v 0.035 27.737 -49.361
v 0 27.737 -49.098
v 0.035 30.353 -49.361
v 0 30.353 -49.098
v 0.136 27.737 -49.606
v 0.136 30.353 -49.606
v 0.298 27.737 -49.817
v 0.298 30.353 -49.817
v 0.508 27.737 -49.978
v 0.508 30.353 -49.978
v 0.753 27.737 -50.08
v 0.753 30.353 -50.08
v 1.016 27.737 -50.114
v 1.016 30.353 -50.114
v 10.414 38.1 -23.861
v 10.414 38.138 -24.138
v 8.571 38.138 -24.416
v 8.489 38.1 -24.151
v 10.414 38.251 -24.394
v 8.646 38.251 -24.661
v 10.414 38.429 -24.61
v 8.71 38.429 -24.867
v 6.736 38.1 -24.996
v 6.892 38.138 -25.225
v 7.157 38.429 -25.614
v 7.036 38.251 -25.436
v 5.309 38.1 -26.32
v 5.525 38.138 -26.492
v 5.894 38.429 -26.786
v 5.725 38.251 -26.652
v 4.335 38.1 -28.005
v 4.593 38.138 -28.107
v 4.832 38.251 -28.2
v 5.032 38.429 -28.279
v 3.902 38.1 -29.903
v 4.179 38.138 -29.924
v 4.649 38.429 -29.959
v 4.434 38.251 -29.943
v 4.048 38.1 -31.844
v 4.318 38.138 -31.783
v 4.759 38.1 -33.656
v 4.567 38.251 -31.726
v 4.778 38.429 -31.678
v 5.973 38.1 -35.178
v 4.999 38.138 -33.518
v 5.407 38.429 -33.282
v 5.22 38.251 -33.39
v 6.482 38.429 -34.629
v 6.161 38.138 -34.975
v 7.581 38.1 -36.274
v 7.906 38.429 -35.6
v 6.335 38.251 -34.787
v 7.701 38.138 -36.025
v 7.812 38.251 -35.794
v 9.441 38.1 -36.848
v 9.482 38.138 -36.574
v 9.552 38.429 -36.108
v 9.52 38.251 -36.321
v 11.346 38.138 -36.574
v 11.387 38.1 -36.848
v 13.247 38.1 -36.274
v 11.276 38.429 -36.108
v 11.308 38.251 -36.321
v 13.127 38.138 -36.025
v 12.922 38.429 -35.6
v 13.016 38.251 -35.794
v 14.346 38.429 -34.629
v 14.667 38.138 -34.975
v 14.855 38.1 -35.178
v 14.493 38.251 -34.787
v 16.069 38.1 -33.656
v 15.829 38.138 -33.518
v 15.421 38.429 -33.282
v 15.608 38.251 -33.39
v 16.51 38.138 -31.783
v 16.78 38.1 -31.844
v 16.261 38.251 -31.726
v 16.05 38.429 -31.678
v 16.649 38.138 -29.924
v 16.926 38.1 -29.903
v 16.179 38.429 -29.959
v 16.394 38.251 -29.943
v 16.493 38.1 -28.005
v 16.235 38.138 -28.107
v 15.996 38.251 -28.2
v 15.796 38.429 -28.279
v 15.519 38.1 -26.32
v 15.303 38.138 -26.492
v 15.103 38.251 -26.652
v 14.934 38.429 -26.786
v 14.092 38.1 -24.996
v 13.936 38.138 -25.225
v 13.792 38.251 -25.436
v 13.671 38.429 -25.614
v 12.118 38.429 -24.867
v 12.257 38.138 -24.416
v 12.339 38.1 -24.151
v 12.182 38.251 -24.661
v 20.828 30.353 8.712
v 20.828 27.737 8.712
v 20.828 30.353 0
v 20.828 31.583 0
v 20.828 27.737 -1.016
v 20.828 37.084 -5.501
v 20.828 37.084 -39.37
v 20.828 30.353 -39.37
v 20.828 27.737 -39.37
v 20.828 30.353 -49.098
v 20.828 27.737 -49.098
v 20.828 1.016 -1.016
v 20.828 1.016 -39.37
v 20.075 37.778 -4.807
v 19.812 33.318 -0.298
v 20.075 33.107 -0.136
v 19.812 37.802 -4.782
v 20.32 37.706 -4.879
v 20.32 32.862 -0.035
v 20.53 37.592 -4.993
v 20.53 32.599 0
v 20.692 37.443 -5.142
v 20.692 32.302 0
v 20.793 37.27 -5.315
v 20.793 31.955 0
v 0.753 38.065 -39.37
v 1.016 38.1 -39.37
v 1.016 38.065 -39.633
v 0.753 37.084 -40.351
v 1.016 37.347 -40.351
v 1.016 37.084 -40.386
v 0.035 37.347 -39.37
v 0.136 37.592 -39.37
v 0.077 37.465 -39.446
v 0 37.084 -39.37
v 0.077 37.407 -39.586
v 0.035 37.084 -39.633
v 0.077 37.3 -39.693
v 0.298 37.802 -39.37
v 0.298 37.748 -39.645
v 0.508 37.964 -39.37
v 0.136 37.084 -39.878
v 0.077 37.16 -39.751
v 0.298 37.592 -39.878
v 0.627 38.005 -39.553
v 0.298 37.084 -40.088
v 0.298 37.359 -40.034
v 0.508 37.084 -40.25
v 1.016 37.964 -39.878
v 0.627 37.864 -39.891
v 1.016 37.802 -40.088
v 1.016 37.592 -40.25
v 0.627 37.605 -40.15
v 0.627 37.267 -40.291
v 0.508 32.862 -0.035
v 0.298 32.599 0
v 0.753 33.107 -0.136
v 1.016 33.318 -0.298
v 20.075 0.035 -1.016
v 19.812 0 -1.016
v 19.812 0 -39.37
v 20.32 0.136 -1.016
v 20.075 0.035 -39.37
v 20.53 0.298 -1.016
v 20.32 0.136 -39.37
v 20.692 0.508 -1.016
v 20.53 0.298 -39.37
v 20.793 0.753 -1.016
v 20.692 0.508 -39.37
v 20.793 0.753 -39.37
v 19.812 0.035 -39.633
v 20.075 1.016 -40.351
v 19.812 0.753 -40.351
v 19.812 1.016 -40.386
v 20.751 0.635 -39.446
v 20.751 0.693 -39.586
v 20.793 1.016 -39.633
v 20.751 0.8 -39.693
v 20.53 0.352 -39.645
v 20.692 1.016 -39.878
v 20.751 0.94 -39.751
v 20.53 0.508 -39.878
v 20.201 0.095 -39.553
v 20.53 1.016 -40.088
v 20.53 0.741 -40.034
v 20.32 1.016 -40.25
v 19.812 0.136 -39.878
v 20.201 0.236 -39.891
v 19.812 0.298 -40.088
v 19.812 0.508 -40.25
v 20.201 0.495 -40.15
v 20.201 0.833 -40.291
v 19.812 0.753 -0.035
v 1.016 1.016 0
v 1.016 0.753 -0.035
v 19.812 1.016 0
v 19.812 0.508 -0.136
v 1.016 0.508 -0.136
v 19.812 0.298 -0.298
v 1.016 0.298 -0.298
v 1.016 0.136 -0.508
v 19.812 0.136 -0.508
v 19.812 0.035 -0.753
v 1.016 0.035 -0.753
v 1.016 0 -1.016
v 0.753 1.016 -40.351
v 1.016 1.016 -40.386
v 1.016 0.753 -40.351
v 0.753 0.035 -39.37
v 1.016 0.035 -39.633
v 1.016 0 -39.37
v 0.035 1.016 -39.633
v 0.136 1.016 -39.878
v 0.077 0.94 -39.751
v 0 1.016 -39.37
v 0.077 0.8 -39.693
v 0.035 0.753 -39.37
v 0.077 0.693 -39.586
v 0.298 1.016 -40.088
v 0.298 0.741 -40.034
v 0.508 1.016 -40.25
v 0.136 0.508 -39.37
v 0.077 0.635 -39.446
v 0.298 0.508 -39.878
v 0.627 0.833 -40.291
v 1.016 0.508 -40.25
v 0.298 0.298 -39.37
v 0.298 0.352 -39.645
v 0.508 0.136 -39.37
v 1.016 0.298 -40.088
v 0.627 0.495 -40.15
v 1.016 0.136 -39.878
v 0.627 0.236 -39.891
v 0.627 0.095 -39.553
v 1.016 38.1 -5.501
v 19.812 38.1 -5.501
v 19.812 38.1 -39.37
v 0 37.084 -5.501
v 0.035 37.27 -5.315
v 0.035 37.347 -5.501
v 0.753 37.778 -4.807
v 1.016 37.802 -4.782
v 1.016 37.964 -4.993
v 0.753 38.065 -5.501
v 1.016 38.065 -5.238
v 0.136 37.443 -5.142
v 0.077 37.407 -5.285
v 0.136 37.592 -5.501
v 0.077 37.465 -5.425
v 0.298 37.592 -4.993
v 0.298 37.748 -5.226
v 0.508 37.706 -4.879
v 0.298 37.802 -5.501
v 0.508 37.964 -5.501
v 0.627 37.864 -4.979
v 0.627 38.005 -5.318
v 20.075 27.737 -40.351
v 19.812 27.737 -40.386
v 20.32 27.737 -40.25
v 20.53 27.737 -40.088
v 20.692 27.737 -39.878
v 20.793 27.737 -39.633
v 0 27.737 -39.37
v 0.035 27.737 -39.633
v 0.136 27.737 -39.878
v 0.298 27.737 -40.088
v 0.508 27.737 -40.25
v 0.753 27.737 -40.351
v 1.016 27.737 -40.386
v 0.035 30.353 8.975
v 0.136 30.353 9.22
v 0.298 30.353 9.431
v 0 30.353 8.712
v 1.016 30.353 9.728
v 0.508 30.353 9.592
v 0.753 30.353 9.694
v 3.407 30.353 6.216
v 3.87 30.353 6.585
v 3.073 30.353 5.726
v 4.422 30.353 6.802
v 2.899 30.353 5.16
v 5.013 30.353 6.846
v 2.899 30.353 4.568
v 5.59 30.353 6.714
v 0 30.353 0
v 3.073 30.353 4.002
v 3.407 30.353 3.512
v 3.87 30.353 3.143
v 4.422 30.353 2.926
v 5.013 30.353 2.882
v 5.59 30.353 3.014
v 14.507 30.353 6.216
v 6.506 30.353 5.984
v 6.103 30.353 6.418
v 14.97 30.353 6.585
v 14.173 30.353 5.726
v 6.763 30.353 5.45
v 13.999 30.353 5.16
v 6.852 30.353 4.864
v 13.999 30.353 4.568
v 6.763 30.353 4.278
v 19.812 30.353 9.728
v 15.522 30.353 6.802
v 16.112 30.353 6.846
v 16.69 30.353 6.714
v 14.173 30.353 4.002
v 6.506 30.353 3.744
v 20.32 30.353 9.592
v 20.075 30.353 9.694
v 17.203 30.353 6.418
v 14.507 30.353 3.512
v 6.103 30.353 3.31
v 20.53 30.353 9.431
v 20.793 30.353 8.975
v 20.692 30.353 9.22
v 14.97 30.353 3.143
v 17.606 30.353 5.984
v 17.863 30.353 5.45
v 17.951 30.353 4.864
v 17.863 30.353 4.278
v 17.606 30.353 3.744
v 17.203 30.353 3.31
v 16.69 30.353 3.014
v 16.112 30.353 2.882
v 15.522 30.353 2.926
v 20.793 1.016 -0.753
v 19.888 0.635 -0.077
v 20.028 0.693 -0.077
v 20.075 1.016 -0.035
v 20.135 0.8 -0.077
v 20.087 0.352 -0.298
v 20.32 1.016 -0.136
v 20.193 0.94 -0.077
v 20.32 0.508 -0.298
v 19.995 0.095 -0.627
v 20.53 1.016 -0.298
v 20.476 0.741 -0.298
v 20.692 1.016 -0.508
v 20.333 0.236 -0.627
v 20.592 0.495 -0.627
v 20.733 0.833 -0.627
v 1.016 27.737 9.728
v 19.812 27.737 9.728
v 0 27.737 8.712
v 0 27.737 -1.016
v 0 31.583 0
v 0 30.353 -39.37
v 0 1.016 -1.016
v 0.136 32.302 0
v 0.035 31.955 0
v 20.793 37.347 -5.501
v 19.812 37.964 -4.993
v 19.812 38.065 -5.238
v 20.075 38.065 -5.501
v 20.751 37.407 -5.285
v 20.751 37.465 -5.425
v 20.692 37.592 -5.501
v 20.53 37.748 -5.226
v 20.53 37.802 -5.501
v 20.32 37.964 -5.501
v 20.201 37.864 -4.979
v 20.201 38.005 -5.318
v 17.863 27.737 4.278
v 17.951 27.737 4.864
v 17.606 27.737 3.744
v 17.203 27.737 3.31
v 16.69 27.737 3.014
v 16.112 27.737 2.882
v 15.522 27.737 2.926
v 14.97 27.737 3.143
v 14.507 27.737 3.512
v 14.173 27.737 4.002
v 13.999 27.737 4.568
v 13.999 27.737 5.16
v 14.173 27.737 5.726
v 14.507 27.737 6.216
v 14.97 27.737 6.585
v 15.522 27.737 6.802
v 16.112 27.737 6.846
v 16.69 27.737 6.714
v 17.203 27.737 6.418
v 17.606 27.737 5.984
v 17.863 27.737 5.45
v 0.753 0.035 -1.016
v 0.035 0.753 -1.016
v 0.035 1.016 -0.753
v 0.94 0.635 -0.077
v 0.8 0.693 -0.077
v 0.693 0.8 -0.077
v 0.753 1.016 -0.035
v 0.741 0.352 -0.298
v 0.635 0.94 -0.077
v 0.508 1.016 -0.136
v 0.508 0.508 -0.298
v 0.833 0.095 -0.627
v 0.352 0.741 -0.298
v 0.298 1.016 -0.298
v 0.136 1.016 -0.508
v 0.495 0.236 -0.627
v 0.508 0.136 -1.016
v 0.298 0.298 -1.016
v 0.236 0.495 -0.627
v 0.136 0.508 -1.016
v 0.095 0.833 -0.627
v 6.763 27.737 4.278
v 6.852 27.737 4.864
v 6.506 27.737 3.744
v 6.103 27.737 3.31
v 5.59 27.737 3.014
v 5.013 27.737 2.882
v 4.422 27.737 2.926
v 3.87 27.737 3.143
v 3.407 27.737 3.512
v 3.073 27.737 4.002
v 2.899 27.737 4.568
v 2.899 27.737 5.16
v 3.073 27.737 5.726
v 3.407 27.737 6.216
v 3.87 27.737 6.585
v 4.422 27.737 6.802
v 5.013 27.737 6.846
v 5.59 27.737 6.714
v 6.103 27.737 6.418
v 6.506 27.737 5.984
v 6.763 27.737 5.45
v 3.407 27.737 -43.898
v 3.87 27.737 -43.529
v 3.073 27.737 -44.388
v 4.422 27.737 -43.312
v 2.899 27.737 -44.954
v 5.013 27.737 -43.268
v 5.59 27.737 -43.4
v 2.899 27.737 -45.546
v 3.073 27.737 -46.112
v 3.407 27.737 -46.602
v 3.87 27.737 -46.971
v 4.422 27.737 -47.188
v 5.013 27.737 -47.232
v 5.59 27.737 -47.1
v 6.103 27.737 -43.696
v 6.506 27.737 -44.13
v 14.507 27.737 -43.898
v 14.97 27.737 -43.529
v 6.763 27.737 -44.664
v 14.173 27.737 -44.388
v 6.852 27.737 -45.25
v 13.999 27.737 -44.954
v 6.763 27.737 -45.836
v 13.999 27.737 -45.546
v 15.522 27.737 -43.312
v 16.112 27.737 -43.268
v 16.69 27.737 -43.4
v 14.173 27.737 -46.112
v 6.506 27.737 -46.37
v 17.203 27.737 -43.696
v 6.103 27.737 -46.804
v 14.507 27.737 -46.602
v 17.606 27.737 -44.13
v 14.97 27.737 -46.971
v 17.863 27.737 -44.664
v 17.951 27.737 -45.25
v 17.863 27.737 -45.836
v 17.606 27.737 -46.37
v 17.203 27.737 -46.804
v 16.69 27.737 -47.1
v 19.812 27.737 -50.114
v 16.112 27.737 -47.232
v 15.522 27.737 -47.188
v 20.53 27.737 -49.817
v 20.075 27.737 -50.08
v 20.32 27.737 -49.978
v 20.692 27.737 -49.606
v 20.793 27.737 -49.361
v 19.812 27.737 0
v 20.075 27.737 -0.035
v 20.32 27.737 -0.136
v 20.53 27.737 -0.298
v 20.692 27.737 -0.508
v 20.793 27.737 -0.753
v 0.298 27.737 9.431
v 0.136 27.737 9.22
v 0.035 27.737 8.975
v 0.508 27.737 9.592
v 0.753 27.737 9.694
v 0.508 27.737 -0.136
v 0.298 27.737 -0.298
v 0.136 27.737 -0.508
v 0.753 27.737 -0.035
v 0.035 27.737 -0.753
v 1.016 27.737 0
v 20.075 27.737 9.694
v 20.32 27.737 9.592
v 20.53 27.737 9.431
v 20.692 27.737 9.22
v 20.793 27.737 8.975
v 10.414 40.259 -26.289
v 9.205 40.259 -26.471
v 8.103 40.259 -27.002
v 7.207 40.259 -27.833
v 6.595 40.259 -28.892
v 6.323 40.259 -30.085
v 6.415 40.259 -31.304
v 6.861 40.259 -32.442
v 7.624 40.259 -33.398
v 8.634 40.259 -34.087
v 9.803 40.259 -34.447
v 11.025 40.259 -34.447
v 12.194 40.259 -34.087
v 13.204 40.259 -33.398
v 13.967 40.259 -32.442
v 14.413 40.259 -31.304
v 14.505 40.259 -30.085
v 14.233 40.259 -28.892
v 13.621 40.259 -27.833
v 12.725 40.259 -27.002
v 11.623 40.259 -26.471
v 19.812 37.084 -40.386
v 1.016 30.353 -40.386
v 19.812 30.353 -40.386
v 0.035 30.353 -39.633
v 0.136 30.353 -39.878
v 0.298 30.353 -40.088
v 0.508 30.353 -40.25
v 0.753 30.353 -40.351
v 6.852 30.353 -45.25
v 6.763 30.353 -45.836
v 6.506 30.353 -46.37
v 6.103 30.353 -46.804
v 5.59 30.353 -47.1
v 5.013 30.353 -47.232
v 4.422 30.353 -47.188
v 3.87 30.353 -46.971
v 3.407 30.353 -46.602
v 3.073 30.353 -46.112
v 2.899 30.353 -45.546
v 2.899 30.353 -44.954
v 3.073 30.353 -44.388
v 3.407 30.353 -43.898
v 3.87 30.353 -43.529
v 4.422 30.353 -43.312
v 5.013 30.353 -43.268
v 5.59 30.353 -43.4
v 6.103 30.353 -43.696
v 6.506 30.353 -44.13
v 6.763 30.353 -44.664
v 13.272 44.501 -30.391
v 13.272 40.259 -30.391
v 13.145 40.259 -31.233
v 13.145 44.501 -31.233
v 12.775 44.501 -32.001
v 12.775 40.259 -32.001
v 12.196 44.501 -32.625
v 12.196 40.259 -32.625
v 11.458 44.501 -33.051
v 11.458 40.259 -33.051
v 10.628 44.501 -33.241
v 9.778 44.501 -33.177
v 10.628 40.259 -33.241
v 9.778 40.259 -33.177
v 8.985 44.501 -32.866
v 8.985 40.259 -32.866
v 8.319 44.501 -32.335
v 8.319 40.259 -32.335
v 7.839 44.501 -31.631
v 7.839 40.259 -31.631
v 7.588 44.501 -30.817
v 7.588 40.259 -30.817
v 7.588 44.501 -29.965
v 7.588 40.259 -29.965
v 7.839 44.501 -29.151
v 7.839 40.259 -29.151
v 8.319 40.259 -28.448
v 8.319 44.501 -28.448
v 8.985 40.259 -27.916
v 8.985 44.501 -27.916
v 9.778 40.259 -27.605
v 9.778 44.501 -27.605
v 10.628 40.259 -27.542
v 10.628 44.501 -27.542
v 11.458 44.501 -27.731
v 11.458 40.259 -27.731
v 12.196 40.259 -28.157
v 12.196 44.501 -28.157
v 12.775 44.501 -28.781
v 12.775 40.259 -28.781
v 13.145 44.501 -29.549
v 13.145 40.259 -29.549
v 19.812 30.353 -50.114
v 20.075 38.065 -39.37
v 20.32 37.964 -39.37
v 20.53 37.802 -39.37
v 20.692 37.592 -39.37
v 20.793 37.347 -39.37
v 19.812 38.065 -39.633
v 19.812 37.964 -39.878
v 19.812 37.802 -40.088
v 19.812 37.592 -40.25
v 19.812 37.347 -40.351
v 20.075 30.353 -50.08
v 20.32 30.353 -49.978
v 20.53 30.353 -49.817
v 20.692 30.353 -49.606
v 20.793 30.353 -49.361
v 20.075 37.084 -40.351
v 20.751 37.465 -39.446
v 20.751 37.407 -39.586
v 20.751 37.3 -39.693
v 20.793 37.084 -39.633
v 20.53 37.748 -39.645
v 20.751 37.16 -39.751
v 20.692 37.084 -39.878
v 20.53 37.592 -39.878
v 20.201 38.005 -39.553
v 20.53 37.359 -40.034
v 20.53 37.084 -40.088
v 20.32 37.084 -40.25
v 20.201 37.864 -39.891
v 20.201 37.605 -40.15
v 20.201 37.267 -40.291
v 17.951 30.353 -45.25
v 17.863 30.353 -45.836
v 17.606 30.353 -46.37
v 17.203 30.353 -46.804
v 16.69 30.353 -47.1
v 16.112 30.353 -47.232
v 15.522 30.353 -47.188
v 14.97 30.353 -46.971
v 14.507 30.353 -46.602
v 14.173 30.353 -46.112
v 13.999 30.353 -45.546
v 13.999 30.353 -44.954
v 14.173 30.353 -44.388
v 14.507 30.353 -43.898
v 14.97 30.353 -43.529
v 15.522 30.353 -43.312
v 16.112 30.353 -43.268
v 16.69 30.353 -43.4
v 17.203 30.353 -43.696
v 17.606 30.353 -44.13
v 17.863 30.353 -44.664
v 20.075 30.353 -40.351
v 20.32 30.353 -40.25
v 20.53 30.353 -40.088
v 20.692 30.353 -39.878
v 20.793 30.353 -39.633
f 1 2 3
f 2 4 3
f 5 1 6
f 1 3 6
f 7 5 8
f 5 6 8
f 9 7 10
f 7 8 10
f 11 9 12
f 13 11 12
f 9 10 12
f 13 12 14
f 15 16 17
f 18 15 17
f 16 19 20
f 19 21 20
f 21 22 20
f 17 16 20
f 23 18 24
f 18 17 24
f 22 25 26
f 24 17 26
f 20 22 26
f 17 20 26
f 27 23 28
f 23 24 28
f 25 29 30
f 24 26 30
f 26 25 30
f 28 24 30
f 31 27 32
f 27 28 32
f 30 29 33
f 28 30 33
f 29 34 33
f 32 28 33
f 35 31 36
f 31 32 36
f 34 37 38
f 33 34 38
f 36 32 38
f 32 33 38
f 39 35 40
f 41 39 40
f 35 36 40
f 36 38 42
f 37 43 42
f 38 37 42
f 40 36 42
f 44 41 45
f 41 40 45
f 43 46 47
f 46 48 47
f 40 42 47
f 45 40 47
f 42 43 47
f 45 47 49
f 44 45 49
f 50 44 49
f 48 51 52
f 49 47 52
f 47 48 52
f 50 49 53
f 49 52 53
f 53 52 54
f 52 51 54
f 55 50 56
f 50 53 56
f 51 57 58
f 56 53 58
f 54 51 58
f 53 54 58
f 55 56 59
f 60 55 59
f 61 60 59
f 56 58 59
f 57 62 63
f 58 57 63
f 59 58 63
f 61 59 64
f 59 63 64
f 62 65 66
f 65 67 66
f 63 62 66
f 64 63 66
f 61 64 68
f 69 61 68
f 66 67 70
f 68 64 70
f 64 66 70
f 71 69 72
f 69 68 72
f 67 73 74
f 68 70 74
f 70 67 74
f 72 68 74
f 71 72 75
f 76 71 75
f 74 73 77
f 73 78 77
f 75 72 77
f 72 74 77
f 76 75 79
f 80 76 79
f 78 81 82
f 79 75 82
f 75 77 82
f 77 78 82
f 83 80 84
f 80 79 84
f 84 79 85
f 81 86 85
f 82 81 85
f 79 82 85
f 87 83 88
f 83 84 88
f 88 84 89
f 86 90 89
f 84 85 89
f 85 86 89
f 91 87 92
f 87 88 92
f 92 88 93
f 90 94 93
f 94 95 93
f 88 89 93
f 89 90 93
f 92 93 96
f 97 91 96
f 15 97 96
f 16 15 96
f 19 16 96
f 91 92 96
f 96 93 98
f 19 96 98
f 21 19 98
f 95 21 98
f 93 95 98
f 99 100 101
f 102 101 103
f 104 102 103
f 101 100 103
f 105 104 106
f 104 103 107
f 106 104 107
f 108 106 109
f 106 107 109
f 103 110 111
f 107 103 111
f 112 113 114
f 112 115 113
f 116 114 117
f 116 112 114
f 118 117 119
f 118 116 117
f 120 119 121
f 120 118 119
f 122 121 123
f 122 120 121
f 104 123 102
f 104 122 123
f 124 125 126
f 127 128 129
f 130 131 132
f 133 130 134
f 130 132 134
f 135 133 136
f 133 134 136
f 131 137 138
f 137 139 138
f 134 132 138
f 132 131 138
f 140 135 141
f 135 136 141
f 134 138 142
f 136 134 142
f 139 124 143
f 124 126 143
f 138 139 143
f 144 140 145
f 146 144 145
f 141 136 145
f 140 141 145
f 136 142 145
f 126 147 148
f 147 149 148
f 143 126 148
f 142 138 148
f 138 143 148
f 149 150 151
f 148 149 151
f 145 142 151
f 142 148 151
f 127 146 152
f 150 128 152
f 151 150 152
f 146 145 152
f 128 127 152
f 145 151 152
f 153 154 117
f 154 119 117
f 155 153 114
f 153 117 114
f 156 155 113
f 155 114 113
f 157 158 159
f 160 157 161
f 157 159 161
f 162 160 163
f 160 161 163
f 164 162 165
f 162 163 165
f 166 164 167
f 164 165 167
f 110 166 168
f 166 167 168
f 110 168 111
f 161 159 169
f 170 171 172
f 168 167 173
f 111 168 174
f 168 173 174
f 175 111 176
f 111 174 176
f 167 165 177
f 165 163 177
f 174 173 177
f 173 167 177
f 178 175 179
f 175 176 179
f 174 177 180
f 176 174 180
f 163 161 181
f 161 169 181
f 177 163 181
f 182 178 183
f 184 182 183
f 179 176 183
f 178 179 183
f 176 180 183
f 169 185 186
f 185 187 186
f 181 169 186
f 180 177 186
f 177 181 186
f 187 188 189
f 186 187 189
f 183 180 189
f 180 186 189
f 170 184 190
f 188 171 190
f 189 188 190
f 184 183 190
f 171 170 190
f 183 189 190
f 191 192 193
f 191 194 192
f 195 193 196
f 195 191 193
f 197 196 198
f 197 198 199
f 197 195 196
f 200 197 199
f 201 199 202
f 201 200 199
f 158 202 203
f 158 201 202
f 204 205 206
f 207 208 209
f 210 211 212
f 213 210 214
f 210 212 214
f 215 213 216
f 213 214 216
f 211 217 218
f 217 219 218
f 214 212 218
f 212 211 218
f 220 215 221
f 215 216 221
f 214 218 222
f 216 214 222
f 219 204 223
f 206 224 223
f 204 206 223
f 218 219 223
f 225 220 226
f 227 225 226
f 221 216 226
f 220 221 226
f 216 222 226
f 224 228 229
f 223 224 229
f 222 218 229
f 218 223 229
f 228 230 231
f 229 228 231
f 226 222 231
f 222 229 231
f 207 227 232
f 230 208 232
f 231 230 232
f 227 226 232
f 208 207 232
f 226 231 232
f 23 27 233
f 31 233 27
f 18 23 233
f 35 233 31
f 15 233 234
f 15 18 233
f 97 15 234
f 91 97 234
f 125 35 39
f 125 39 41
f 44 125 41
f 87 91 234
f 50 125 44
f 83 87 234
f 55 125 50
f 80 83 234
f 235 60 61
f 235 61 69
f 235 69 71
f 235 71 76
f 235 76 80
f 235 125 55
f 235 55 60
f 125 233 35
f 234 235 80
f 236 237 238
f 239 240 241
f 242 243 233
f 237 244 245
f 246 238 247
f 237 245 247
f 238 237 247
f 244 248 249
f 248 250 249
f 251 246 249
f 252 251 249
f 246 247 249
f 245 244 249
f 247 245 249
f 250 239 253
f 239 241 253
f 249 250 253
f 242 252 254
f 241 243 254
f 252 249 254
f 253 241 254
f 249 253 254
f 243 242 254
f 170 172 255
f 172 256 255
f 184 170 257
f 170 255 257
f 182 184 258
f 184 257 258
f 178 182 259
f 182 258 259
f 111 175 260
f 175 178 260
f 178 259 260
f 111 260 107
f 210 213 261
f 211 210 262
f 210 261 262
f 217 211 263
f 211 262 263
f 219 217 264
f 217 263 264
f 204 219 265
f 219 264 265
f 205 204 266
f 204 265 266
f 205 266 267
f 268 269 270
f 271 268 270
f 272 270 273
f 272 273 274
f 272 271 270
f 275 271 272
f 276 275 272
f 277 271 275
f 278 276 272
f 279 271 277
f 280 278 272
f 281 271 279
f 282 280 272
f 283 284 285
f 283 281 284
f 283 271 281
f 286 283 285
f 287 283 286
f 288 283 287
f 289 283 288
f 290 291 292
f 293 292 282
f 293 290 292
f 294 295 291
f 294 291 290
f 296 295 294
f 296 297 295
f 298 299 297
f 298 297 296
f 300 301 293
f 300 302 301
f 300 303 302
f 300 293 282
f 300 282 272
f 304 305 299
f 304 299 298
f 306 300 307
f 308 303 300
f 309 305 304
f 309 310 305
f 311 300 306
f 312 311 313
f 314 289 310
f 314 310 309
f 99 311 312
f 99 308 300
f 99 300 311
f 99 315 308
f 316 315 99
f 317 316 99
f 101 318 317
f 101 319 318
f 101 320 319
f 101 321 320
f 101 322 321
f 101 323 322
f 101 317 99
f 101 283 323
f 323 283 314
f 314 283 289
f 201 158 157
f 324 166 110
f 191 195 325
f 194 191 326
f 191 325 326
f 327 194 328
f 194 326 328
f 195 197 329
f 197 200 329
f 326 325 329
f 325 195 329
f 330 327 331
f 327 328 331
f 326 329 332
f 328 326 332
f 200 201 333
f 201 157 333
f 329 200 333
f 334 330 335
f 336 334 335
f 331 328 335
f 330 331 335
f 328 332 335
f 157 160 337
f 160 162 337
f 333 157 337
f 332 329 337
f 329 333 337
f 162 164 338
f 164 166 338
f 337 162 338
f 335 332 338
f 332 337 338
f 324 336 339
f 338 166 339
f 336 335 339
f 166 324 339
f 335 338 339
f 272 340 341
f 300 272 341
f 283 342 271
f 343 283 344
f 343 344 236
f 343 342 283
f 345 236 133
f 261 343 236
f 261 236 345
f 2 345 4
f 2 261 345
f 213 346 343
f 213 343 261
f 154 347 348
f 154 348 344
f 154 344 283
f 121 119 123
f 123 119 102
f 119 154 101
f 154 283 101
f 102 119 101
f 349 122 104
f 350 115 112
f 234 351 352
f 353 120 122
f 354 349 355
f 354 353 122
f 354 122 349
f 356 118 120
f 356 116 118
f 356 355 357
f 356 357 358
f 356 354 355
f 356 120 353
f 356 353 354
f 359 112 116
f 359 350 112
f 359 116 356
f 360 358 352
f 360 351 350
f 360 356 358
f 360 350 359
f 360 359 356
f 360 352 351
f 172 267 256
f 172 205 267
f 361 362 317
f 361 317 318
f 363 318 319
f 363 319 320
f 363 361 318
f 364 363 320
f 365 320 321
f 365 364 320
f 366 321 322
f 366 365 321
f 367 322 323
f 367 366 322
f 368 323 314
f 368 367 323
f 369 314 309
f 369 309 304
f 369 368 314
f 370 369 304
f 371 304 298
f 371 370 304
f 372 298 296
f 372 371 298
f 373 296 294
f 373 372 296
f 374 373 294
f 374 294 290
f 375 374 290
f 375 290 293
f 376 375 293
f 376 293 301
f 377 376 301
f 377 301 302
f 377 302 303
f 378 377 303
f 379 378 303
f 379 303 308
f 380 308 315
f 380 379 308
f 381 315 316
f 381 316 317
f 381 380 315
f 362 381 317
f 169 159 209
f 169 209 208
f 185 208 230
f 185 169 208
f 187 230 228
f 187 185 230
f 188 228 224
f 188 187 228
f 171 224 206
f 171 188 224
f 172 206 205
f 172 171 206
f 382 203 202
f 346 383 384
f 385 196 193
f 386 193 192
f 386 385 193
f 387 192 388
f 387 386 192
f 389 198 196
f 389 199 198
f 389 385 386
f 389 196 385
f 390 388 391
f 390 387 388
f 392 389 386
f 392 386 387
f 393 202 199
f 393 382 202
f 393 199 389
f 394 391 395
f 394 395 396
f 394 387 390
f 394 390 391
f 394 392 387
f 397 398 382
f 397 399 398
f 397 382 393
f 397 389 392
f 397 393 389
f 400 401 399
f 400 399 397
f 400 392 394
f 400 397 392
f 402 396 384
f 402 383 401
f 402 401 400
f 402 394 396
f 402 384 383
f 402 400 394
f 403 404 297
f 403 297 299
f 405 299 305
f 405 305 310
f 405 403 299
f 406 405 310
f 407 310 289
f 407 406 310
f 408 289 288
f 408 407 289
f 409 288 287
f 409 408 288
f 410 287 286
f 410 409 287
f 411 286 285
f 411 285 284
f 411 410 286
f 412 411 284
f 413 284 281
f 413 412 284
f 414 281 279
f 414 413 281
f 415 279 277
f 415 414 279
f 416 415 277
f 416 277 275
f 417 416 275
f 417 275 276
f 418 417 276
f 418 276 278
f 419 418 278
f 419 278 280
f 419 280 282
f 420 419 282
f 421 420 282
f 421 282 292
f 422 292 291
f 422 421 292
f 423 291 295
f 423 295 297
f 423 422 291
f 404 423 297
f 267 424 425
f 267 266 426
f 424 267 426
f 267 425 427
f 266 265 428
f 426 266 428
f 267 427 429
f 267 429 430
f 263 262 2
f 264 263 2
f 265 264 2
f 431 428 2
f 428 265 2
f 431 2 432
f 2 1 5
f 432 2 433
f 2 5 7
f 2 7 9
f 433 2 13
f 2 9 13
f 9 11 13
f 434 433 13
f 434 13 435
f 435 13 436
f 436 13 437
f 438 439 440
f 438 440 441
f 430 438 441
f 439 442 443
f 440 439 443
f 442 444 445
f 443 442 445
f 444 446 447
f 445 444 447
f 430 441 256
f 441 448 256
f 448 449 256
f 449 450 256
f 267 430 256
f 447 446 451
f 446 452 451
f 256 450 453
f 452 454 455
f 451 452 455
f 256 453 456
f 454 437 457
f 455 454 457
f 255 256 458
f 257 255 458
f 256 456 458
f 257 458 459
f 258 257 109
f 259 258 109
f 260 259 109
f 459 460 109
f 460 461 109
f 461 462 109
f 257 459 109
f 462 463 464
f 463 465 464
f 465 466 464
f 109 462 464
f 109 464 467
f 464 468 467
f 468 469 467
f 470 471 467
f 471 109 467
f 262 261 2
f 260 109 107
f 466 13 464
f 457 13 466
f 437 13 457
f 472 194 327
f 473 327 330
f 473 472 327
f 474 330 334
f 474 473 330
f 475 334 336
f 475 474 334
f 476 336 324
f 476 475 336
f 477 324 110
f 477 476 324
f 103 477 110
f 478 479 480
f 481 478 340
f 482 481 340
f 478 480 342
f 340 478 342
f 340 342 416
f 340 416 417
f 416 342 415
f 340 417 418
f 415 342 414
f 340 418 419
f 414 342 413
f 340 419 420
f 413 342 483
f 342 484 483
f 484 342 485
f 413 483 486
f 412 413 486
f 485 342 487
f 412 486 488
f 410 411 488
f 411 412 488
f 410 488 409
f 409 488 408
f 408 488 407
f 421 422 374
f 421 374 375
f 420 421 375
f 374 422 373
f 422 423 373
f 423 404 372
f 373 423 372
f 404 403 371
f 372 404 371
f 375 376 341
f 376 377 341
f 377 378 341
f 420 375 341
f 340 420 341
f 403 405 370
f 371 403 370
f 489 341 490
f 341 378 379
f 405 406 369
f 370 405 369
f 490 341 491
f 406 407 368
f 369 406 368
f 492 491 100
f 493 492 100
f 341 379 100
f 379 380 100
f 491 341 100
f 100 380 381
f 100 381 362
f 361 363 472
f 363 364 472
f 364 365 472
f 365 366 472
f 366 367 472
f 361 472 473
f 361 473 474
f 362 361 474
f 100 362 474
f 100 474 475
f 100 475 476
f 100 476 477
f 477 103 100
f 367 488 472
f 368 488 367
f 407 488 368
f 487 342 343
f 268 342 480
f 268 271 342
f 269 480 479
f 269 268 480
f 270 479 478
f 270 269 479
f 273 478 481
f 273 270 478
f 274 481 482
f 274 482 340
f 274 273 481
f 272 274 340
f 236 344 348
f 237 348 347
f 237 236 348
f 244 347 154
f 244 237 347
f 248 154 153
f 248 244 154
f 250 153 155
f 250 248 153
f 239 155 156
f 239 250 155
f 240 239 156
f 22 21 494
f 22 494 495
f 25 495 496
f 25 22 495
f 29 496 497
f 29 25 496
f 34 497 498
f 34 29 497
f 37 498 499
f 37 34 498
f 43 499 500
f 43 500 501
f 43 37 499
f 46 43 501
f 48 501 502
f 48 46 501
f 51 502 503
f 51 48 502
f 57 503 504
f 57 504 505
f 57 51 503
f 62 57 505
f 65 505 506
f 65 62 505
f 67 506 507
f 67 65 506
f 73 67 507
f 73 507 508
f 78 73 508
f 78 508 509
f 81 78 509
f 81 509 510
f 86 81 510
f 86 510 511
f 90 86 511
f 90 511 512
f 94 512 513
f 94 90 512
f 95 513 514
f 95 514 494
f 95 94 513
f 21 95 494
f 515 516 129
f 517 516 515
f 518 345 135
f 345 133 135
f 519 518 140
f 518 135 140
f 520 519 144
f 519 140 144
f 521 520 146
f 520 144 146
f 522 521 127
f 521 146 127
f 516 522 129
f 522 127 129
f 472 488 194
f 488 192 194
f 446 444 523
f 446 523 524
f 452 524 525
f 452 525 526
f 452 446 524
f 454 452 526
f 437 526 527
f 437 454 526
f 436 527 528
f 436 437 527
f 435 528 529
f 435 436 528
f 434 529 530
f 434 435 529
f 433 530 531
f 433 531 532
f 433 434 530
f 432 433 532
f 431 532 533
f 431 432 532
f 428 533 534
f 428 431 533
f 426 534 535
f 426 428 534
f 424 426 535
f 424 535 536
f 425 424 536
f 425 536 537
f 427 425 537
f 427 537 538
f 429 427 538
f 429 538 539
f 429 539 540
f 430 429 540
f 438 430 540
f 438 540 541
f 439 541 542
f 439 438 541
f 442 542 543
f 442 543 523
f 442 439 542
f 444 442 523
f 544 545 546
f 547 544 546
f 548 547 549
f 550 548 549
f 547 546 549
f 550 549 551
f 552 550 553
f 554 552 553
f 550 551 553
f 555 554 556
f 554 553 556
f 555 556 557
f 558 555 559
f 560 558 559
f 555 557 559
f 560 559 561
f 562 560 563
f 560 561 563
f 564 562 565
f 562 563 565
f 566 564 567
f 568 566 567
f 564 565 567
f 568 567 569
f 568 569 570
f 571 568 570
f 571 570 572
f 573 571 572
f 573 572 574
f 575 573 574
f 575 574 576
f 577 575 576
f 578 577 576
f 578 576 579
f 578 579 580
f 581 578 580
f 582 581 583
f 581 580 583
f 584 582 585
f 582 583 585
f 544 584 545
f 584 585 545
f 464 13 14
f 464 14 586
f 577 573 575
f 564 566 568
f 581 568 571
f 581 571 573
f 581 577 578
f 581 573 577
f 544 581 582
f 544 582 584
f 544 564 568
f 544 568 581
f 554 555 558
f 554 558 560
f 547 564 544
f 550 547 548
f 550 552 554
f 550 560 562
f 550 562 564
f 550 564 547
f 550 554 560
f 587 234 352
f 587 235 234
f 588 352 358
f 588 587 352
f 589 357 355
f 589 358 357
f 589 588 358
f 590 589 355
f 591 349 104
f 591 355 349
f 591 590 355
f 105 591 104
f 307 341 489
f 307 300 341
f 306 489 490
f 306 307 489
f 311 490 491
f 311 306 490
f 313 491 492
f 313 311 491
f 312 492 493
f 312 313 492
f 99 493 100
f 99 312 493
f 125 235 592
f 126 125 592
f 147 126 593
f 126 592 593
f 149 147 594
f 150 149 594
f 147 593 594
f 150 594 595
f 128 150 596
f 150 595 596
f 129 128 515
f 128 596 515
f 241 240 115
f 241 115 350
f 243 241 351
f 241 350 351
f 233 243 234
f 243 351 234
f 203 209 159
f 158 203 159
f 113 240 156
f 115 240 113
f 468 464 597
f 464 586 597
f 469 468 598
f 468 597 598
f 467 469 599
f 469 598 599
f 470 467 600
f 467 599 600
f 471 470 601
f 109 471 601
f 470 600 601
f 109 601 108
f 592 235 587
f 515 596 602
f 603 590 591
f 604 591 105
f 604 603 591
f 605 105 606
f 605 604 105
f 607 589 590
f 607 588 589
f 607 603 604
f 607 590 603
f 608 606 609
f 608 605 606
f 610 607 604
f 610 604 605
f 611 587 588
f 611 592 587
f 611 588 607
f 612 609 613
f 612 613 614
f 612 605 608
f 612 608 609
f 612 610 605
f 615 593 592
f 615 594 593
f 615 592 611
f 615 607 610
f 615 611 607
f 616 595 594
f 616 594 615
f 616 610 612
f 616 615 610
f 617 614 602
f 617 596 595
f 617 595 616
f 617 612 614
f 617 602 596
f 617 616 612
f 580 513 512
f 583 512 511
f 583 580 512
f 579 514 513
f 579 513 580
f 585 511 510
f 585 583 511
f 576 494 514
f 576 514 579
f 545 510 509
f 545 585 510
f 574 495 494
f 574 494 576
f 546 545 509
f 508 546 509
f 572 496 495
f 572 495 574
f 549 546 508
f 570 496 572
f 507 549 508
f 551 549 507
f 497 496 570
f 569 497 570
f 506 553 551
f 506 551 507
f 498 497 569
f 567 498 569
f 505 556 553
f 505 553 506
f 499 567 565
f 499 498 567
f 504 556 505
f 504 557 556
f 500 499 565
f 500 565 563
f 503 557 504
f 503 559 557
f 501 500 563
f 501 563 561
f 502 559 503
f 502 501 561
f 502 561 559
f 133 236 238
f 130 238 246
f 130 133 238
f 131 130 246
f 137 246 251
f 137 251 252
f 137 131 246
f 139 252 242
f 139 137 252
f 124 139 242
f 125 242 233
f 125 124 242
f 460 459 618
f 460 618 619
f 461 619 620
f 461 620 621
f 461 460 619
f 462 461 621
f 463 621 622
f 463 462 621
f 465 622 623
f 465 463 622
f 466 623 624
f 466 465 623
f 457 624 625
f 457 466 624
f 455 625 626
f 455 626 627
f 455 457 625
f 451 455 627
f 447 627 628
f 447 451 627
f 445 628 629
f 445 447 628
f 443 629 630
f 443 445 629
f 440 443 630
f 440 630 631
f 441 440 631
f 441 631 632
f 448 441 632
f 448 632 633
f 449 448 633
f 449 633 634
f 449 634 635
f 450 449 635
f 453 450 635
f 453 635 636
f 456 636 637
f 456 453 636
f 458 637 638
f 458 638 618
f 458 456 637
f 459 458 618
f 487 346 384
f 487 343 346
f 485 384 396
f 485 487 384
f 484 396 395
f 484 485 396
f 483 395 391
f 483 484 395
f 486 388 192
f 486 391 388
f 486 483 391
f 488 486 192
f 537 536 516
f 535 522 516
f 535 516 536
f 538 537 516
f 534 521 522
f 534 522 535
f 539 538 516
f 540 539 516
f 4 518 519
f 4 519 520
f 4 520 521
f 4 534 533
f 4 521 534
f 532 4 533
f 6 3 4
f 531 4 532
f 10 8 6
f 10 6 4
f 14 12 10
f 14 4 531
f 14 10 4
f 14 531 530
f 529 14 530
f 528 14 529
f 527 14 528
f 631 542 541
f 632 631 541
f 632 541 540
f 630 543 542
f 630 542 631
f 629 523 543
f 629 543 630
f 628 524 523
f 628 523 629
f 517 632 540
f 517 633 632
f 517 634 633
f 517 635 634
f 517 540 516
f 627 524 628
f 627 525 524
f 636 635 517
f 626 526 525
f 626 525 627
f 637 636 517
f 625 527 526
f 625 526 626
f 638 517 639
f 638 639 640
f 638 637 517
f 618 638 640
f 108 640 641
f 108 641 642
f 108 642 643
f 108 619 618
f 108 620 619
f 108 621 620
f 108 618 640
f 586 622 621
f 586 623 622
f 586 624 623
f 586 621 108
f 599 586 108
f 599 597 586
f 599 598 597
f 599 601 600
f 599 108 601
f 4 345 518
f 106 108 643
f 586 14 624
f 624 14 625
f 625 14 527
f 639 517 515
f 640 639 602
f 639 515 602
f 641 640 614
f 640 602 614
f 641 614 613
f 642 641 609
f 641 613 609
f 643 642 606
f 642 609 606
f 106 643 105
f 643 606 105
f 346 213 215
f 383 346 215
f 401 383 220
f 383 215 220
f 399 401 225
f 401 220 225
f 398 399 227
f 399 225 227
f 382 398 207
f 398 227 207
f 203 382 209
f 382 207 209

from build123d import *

# Parameters (mm, degrees)
SKETCH1_W           = 20.828
SKETCH1_H           = 40.386
BOSS_EXTRUDE1_DEPTH = 38.1
SKETCH2_W           = 20.828
SKETCH2_H           = 59.8424
SKETCH2_R           = 1.98755
BOSS_EXTRUDE2_DEPTH = 2.6162
SKETCH5_R           = 2.8575
BOSS_EXTRUDE3_DEPTH = 4.2418
CHAMFER1_SIZE       = 5.08
FILLET4_R           = 1.016


with BuildPart() as part:
    # Sketch1 → Boss-Extrude1 (new body)
    with BuildSketch(Plane(origin=(0, 0, 0), x_dir=(1, 0, 0), z_dir=(0, 1, 0))):
        with Locations((10.414, 20.193)):
            Rectangle(SKETCH1_W, SKETCH1_H)
    extrude(amount=BOSS_EXTRUDE1_DEPTH)

    # Sketch2 → Boss-Extrude2 (add)
    with BuildSketch(Plane(origin=(0, 27.7368, 0), x_dir=(1, 0, 0), z_dir=(0, 1, 0))):
        with Locations((10.414, 20.193)):
            Rectangle(SKETCH2_W, SKETCH2_H)
        with Locations((4.8641, 45.2501)):
            Circle(SKETCH2_R, mode=Mode.SUBTRACT)
        with Locations((15.9639, 45.2501)):
            Circle(SKETCH2_R, mode=Mode.SUBTRACT)
        with Locations((15.9639, -4.8641)):
            Circle(SKETCH2_R, mode=Mode.SUBTRACT)
        with Locations((4.8641, -4.8641)):
            Circle(SKETCH2_R, mode=Mode.SUBTRACT)
    extrude(amount=BOSS_EXTRUDE2_DEPTH)

    # Sketch4 → Revolve1 (revolve)
    with BuildSketch(Plane(origin=(10.414, 0, 0), x_dir=(0, 0, -1), z_dir=(1, 0, 0))):
        Polygon((30.3911, 40.259), (26.289, 40.259), (24.3078, 38.1), (30.3911, 38.1), align=None)
    revolve(axis=Axis((10.414, 40.259, -30.3911), (0, -1, 0)))

    # Sketch5 → Boss-Extrude3 (add)
    with BuildSketch(Plane(origin=(0, 40.259, 0), x_dir=(1, 0, 0), z_dir=(0, 1, 0))):
        with Locations((10.414, 30.3911)):
            Circle(SKETCH5_R)
    extrude(amount=BOSS_EXTRUDE3_DEPTH)

    # Chamfer1
    chamfer1_edges = [part.edges().sort_by_distance(p)[0] for p in [
        (10.414, 38.1, 0),
    ]]
    chamfer(chamfer1_edges, length=CHAMFER1_SIZE)

    # Fillet4
    fillet4_edges = [part.edges().sort_by_distance(p)[0] for p in [
        (10.414, 38.1, -40.386),
        (20.828, 38.1, -22.733),
        (0, 38.1, -22.733),
        (10.414, 38.1, -36.4744),
        (10.414, 38.1, -5.08),
        (20.828, 35.56, -2.54),
        (10.414, 33.02, 0),
        (0, 35.56, -2.54),
        (10.414, 0, -40.386),
        (0, 13.8684, -40.386),
        (0, 0, -20.193),
        (20.828, 0, -20.193),
        (10.414, 0, 0),
        (20.828, 13.8684, -40.386),
        (0, 13.8684, 0),
        (20.828, 13.8684, 0),
        (0, 34.2265, -40.386),
        (20.828, 34.2265, -40.386),
        (0, 29.0449, 9.7282),
        (20.828, 29.0449, 9.7282),
        (0, 29.0449, -50.1142),
        (20.828, 29.0449, -50.1142),
    ]]
    fillet(fillet4_edges, radius=FILLET4_R)


solid = part.part
